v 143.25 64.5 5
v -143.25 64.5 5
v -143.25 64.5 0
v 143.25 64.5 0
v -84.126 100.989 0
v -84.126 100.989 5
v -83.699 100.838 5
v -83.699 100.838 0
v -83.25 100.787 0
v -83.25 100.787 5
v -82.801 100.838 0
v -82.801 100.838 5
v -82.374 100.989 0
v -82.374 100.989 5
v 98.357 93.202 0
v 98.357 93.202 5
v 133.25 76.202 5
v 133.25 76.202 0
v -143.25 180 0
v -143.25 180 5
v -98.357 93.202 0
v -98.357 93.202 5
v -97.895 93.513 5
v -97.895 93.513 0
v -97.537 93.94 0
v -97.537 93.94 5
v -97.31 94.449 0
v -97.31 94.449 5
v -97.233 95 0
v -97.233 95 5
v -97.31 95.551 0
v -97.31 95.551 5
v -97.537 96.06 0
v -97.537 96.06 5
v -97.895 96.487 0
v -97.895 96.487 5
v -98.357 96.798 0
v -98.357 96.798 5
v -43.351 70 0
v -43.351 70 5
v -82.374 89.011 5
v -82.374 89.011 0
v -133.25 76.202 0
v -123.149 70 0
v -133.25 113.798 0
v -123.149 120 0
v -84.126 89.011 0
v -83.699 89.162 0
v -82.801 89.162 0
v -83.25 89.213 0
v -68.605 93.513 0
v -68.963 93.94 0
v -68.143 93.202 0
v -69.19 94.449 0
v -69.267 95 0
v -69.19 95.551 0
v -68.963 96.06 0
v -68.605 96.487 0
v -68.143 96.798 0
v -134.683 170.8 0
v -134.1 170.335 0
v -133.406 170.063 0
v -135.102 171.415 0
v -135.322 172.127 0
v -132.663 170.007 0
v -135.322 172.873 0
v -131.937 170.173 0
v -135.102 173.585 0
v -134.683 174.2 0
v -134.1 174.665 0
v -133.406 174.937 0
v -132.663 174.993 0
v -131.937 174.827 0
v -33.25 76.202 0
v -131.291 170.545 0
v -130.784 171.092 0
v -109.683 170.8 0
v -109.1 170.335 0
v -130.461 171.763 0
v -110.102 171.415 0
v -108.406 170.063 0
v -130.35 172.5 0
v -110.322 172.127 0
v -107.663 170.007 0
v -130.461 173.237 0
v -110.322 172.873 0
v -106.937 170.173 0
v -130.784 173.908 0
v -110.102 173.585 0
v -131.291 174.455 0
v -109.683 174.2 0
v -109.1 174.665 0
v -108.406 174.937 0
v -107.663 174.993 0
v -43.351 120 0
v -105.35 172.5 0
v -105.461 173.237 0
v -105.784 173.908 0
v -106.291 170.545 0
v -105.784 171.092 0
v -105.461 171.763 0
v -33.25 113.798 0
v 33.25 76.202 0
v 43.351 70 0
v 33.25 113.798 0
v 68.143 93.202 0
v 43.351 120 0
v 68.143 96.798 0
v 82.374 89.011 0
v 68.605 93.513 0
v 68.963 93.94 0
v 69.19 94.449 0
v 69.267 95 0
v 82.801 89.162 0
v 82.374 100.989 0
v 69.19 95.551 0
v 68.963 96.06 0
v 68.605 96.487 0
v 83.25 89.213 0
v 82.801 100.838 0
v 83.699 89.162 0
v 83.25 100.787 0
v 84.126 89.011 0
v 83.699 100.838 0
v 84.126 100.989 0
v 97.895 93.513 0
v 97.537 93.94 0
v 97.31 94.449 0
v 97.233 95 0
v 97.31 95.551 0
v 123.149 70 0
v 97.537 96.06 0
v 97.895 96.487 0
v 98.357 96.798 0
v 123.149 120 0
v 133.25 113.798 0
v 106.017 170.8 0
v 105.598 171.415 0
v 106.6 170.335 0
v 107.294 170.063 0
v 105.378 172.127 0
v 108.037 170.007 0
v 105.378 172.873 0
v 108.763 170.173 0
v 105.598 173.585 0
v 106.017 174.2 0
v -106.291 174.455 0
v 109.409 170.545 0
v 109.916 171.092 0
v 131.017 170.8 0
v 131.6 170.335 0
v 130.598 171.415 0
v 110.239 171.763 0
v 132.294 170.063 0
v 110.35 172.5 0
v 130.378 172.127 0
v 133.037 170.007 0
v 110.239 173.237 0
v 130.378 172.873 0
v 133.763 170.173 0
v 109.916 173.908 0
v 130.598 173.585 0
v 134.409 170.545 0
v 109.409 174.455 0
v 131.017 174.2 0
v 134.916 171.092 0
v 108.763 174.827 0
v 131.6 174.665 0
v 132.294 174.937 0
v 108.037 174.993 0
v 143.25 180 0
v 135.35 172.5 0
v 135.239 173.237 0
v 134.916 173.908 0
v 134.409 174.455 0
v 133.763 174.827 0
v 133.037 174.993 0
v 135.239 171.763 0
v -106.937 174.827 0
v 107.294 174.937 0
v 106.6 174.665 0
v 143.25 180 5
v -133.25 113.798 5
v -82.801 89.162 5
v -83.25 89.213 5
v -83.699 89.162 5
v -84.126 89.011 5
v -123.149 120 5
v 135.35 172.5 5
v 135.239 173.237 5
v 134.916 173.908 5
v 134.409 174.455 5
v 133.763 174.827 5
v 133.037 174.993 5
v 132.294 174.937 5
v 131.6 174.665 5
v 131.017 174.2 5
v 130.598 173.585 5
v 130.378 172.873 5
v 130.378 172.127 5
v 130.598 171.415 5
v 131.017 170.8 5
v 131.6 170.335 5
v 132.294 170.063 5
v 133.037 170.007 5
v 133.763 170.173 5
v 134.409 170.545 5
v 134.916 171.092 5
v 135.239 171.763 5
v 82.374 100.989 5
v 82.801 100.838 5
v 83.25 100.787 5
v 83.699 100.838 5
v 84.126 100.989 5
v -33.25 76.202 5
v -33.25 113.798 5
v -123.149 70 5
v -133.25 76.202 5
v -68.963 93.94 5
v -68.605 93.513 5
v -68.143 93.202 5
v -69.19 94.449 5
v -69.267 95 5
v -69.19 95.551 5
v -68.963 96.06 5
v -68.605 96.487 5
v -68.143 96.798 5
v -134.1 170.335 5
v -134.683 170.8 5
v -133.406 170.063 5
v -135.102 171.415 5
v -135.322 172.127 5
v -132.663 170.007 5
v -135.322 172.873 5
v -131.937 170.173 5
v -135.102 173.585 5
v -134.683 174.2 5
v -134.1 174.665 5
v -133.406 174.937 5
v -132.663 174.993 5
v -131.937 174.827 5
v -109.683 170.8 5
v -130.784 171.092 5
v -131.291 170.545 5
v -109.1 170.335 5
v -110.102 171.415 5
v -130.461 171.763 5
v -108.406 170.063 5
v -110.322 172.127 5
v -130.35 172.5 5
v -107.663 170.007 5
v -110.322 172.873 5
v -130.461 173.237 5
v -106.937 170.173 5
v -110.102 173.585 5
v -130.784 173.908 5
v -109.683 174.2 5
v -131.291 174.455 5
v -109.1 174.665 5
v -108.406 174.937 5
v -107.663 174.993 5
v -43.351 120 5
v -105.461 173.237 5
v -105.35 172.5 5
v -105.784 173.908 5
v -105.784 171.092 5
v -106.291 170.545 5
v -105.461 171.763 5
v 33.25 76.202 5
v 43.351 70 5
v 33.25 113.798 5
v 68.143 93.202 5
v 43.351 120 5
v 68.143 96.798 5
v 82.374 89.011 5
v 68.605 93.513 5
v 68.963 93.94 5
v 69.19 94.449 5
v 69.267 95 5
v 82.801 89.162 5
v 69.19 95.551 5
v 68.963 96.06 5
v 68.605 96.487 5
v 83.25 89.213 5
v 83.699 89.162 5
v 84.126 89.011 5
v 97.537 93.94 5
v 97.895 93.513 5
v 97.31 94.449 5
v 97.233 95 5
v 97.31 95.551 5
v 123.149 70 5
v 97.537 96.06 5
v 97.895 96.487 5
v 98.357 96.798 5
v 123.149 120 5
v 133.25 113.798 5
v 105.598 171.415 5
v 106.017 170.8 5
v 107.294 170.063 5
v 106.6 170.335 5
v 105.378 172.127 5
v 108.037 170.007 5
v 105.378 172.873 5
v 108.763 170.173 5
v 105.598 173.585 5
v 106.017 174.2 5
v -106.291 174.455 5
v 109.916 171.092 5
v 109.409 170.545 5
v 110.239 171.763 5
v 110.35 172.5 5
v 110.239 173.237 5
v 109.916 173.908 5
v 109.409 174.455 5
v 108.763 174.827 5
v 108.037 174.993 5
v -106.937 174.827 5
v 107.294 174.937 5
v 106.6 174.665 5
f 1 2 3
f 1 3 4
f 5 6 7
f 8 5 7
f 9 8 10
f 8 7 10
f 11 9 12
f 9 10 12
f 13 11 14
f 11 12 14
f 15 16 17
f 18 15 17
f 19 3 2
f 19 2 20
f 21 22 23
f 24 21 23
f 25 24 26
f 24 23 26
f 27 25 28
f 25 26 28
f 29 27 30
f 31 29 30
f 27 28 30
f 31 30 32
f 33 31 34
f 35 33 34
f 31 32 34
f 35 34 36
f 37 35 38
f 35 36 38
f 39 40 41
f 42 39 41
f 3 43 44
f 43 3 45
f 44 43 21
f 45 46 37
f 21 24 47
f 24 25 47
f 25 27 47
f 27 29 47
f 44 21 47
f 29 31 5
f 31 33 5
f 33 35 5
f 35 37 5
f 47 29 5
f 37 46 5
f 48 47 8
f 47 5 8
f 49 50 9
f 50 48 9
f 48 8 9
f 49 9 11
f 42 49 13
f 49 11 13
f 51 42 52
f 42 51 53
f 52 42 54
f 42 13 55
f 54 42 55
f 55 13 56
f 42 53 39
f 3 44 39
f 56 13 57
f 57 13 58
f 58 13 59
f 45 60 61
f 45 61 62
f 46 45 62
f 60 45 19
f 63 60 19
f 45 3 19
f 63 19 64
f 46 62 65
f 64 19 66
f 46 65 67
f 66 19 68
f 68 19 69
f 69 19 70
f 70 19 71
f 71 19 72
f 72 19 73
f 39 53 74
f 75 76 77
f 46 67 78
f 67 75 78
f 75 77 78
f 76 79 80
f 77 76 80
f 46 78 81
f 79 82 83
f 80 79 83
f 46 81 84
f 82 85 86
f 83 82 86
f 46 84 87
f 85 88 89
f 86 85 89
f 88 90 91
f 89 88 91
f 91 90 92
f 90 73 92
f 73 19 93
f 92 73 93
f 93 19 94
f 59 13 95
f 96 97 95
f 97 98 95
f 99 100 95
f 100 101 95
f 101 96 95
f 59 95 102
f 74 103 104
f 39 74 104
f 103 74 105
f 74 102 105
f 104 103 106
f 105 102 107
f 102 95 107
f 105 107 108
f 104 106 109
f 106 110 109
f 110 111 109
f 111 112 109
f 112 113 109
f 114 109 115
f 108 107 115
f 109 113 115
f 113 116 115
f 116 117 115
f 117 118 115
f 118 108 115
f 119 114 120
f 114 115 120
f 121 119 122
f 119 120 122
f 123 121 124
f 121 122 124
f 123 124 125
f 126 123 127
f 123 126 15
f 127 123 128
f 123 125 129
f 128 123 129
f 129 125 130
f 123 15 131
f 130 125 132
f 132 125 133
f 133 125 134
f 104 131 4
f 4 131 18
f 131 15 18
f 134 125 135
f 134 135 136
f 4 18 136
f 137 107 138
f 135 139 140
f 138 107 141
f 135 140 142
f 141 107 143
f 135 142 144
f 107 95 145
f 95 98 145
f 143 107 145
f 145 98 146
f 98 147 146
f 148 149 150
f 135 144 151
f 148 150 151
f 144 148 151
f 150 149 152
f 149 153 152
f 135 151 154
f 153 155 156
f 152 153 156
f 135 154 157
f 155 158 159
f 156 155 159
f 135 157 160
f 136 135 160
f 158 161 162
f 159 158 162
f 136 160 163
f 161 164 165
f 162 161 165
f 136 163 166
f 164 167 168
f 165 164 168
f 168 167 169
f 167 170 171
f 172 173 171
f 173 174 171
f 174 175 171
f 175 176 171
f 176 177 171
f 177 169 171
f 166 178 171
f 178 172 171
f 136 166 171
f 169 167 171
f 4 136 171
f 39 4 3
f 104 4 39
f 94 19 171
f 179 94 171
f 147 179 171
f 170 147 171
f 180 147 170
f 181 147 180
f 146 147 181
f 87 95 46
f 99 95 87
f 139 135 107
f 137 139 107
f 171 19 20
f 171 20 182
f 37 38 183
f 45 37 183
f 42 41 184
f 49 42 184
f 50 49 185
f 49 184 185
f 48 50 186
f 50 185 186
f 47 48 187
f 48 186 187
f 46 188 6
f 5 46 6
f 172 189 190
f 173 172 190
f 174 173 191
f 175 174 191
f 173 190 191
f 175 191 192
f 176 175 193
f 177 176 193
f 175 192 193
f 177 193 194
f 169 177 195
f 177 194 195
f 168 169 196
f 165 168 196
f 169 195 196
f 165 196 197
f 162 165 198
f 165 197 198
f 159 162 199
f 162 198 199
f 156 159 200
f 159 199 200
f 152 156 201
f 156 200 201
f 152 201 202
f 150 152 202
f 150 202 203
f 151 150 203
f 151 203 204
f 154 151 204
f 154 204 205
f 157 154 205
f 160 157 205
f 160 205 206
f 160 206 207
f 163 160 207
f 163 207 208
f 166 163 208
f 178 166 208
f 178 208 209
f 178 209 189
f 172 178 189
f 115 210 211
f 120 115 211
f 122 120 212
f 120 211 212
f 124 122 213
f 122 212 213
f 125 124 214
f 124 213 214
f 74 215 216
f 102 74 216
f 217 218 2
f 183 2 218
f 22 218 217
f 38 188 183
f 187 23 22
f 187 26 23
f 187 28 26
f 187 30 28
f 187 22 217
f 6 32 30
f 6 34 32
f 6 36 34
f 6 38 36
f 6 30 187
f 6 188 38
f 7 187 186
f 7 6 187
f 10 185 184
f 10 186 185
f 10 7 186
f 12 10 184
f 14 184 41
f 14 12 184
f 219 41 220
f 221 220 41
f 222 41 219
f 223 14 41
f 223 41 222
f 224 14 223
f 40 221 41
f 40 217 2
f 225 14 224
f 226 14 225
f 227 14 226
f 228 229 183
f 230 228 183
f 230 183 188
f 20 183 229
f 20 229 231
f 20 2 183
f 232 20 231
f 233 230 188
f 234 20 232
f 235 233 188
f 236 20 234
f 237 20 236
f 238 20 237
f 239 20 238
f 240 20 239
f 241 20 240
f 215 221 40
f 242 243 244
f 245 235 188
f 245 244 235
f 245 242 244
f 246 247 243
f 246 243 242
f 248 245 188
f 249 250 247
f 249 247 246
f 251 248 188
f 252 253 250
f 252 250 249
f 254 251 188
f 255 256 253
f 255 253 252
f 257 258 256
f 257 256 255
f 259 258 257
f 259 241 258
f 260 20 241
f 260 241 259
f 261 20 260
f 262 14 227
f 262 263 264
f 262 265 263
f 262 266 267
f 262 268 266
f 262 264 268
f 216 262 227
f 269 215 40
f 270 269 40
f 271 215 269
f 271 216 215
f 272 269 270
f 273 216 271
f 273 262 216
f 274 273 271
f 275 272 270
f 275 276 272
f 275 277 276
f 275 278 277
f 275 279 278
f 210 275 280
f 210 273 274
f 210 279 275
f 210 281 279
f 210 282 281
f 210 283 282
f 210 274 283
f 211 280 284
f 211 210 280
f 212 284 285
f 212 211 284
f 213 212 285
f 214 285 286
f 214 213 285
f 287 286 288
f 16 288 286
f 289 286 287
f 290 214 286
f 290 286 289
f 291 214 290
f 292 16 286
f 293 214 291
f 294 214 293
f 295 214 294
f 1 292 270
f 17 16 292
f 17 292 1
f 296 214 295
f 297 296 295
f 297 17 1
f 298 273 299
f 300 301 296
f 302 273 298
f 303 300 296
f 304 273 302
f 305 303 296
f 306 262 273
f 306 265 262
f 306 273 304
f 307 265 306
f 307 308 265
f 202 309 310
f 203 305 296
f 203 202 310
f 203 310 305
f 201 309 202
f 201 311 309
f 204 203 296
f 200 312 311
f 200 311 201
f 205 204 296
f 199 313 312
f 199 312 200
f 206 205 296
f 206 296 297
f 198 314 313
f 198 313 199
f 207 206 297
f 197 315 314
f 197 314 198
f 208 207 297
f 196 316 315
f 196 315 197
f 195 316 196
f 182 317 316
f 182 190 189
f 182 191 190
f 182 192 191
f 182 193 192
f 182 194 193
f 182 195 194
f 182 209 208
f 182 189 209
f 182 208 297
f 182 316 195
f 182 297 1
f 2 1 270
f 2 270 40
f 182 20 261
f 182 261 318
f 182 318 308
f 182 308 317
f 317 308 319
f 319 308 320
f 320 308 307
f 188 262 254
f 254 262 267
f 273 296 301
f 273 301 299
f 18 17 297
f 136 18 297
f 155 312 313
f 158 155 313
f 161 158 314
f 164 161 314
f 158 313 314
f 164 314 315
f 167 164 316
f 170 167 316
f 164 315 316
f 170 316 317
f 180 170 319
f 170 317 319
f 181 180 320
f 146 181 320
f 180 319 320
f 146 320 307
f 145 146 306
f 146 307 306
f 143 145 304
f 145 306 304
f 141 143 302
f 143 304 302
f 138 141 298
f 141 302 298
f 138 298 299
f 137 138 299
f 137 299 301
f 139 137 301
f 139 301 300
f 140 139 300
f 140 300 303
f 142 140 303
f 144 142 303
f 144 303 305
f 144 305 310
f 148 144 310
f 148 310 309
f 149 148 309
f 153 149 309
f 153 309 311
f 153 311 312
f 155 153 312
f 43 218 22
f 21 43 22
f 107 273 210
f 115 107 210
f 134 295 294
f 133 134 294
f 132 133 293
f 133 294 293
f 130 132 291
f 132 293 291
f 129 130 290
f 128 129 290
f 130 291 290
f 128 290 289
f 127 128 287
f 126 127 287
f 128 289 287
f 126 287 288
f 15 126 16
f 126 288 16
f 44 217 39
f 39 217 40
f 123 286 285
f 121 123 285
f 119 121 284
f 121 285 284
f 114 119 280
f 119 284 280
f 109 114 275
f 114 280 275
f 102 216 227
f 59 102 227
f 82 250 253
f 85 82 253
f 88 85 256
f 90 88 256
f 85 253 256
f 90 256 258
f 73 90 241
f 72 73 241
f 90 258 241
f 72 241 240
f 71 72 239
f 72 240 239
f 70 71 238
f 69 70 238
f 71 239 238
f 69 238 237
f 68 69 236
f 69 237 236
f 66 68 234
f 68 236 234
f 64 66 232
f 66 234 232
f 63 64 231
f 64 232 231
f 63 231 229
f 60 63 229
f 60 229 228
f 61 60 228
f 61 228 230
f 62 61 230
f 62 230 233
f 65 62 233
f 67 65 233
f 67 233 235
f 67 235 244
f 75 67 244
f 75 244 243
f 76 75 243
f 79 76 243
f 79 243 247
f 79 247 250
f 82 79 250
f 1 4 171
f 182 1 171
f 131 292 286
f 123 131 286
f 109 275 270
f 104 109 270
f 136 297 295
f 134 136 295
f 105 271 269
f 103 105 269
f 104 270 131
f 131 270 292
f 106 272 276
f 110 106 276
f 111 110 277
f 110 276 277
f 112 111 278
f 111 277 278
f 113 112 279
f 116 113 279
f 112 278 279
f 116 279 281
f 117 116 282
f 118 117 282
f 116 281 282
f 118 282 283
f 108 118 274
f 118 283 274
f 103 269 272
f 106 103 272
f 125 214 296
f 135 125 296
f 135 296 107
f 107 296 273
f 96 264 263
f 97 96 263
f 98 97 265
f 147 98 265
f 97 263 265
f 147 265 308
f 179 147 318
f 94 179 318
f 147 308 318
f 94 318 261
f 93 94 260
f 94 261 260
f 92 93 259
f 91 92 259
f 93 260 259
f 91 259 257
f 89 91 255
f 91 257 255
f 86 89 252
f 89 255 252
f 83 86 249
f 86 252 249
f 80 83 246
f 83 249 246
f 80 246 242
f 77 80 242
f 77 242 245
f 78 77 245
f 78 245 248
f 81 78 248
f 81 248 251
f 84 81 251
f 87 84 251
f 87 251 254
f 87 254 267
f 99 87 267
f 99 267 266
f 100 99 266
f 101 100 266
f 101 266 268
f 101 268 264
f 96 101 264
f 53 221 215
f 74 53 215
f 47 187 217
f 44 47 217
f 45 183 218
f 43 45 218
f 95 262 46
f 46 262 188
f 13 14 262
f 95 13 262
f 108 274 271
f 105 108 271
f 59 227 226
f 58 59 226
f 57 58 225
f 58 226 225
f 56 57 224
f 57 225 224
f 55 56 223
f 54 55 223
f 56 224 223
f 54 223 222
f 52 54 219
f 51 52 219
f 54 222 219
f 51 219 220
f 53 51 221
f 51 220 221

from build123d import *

# Parameters (mm, degrees)
SKETCH6_W           = 286.5
SKETCH6_H           = 180
BOSS_EXTRUDE3_DEPTH = 5
SKETCH7_R           = 2.5
CUT_EXTRUDE1_DEPTH  = 13
SKETCH8_W           = 286.5
SKETCH8_H           = 64.5
CUT_EXTRUDE2_DEPTH  = 6


with BuildPart() as part:
    # Sketch6 → Boss-Extrude3 (new body)
    with BuildSketch(Plane.XY):
        with Locations((0, 90)):
            Rectangle(SKETCH6_W, SKETCH6_H)
    extrude(amount=BOSS_EXTRUDE3_DEPTH)

    # Sketch7 → Cut-Extrude1 (cut)
    with BuildSketch(Plane.XY.offset(5)):
        with Locations((-132.85, 172.5)):
            Circle(SKETCH7_R)
        with Locations((-107.85, 172.5)):
            Circle(SKETCH7_R)
        with BuildLine():
            Line((-82.374047462, 100.988572935), (-43.351346631, 120))
            Line((-43.351346631, 120), (-123.148653369, 120))
            Line((-123.148653369, 120), (-84.125952538, 100.988572935))
            ThreePointArc((-84.125952538, 100.988572935), (-83.25, 100.786546002), (-82.374047462, 100.988572935))
        make_face()
        with BuildLine():
            Line((-133.25, 113.797626904), (-133.25, 76.202373096))
            Line((-133.25, 76.202373096), (-98.356648563, 93.202026933))
            ThreePointArc((-98.356648563, 93.202026933), (-97.232601102, 95), (-98.356648563, 96.797973067))
            Line((-98.356648563, 96.797973067), (-133.25, 113.797626904))
        make_face()
        with BuildLine():
            Line((-68.143351437, 93.202026933), (-33.25, 76.202373096))
            Line((-33.25, 76.202373096), (-33.25, 113.797626904))
            Line((-33.25, 113.797626904), (-68.143351437, 96.797973067))
            ThreePointArc((-68.143351437, 96.797973067), (-69.267398898, 95), (-68.143351437, 93.202026933))
        make_face()
        with BuildLine():
            Line((-43.351346631, 70), (-82.374047462, 89.011427065))
            ThreePointArc((-82.374047462, 89.011427065), (-83.25, 89.213453998), (-84.125952538, 89.011427065))
            Line((-84.125952538, 89.011427065), (-123.148653369, 70))
            Line((-123.148653369, 70), (-43.351346631, 70))
        make_face()
        with BuildLine():
            Line((-43.351346631, 60), (-123.148653369, 60))
            Line((-123.148653369, 60), (-84.125952538, 40.988572935))
            ThreePointArc((-84.125952538, 40.988572935), (-83.25, 40.786546002), (-82.374047462, 40.988572935))
            Line((-82.374047462, 40.988572935), (-43.351346631, 60))
        make_face()
        with BuildLine():
            Line((-98.356648563, 36.797973067), (-133.25, 53.797626904))
            Line((-133.25, 53.797626904), (-133.25, 16.202373096))
            Line((-133.25, 16.202373096), (-98.356648563, 33.202026933))
            ThreePointArc((-98.356648563, 33.202026933), (-97.232601102, 35), (-98.356648563, 36.797973067))
        make_face()
        with BuildLine():
            Line((-33.25, 16.202373096), (-33.25, 53.797626904))
            Line((-33.25, 53.797626904), (-68.143351437, 36.797973067))
            ThreePointArc((-68.143351437, 36.797973067), (-69.267398898, 35), (-68.143351437, 33.202026933))
            Line((-68.143351437, 33.202026933), (-33.25, 16.202373096))
        make_face()
        with BuildLine():
            Line((-84.125952538, 29.011427065), (-123.148653369, 10))
            Line((-123.148653369, 10), (-43.351346631, 10))
            Line((-43.351346631, 10), (-82.374047462, 29.011427065))
            ThreePointArc((-82.374047462, 29.011427065), (-83.25, 29.213453998), (-84.125952538, 29.011427065))
        make_face()
        with BuildLine():
            Line((84.125952538, 100.988572935), (123.148653369, 120))
            Line((123.148653369, 120), (43.351346631, 120))
            Line((43.351346631, 120), (82.374047462, 100.988572935))
            ThreePointArc((82.374047462, 100.988572935), (83.25, 100.786546002), (84.125952538, 100.988572935))
        make_face()
        with BuildLine():
            Line((33.25, 113.797626904), (33.25, 76.202373096))
            Line((33.25, 76.202373096), (68.143351437, 93.202026933))
            ThreePointArc((68.143351437, 93.202026933), (69.267398898, 95), (68.143351437, 96.797973067))
            Line((68.143351437, 96.797973067), (33.25, 113.797626904))
        make_face()
        with BuildLine():
            Line((98.356648563, 93.202026933), (133.25, 76.202373096))
            Line((133.25, 76.202373096), (133.25, 113.797626904))
            Line((133.25, 113.797626904), (98.356648563, 96.797973067))
            ThreePointArc((98.356648563, 96.797973067), (97.232601102, 95), (98.356648563, 93.202026933))
        make_face()
        with BuildLine():
            Line((43.351346631, 70), (123.148653369, 70))
            Line((123.148653369, 70), (84.125952538, 89.011427065))
            ThreePointArc((84.125952538, 89.011427065), (83.25, 89.213453998), (82.374047462, 89.011427065))
            Line((82.374047462, 89.011427065), (43.351346631, 70))
        make_face()
        with BuildLine():
            Line((43.351346631, 60), (82.374047462, 40.988572935))
            ThreePointArc((82.374047462, 40.988572935), (83.25, 40.786546002), (84.125952538, 40.988572935))
            Line((84.125952538, 40.988572935), (123.148653369, 60))
            Line((123.148653369, 60), (43.351346631, 60))
        make_face()
        with BuildLine():
            Line((68.143351437, 36.797973067), (33.25, 53.797626904))
            Line((33.25, 53.797626904), (33.25, 16.202373096))
            Line((33.25, 16.202373096), (68.143351437, 33.202026933))
            ThreePointArc((68.143351437, 33.202026933), (69.267398898, 35), (68.143351437, 36.797973067))
        make_face()
        with BuildLine():
            Line((133.25, 16.202373096), (133.25, 53.797626904))
            Line((133.25, 53.797626904), (98.356648563, 36.797973067))
            ThreePointArc((98.356648563, 36.797973067), (97.232601102, 35), (98.356648563, 33.202026933))
            Line((98.356648563, 33.202026933), (133.25, 16.202373096))
        make_face()
        with BuildLine():
            Line((82.374047462, 29.011427065), (43.351346631, 10))
            Line((43.351346631, 10), (123.148653369, 10))
            Line((123.148653369, 10), (84.125952538, 29.011427065))
            ThreePointArc((84.125952538, 29.011427065), (83.25, 29.213453998), (82.374047462, 29.011427065))
        make_face()
        with Locations((107.85, 172.5)):
            Circle(SKETCH7_R)
        with Locations((132.85, 172.5)):
            Circle(SKETCH7_R)
    extrude(amount=-CUT_EXTRUDE1_DEPTH, mode=Mode.SUBTRACT)

    # Sketch8 → Cut-Extrude2 (cut, through all)
    with BuildSketch(Plane.XY.offset(5)):
        with Locations((0, 32.25)):
            Rectangle(SKETCH8_W, SKETCH8_H)
    extrude(amount=-CUT_EXTRUDE2_DEPTH, mode=Mode.SUBTRACT)


solid = part.part
